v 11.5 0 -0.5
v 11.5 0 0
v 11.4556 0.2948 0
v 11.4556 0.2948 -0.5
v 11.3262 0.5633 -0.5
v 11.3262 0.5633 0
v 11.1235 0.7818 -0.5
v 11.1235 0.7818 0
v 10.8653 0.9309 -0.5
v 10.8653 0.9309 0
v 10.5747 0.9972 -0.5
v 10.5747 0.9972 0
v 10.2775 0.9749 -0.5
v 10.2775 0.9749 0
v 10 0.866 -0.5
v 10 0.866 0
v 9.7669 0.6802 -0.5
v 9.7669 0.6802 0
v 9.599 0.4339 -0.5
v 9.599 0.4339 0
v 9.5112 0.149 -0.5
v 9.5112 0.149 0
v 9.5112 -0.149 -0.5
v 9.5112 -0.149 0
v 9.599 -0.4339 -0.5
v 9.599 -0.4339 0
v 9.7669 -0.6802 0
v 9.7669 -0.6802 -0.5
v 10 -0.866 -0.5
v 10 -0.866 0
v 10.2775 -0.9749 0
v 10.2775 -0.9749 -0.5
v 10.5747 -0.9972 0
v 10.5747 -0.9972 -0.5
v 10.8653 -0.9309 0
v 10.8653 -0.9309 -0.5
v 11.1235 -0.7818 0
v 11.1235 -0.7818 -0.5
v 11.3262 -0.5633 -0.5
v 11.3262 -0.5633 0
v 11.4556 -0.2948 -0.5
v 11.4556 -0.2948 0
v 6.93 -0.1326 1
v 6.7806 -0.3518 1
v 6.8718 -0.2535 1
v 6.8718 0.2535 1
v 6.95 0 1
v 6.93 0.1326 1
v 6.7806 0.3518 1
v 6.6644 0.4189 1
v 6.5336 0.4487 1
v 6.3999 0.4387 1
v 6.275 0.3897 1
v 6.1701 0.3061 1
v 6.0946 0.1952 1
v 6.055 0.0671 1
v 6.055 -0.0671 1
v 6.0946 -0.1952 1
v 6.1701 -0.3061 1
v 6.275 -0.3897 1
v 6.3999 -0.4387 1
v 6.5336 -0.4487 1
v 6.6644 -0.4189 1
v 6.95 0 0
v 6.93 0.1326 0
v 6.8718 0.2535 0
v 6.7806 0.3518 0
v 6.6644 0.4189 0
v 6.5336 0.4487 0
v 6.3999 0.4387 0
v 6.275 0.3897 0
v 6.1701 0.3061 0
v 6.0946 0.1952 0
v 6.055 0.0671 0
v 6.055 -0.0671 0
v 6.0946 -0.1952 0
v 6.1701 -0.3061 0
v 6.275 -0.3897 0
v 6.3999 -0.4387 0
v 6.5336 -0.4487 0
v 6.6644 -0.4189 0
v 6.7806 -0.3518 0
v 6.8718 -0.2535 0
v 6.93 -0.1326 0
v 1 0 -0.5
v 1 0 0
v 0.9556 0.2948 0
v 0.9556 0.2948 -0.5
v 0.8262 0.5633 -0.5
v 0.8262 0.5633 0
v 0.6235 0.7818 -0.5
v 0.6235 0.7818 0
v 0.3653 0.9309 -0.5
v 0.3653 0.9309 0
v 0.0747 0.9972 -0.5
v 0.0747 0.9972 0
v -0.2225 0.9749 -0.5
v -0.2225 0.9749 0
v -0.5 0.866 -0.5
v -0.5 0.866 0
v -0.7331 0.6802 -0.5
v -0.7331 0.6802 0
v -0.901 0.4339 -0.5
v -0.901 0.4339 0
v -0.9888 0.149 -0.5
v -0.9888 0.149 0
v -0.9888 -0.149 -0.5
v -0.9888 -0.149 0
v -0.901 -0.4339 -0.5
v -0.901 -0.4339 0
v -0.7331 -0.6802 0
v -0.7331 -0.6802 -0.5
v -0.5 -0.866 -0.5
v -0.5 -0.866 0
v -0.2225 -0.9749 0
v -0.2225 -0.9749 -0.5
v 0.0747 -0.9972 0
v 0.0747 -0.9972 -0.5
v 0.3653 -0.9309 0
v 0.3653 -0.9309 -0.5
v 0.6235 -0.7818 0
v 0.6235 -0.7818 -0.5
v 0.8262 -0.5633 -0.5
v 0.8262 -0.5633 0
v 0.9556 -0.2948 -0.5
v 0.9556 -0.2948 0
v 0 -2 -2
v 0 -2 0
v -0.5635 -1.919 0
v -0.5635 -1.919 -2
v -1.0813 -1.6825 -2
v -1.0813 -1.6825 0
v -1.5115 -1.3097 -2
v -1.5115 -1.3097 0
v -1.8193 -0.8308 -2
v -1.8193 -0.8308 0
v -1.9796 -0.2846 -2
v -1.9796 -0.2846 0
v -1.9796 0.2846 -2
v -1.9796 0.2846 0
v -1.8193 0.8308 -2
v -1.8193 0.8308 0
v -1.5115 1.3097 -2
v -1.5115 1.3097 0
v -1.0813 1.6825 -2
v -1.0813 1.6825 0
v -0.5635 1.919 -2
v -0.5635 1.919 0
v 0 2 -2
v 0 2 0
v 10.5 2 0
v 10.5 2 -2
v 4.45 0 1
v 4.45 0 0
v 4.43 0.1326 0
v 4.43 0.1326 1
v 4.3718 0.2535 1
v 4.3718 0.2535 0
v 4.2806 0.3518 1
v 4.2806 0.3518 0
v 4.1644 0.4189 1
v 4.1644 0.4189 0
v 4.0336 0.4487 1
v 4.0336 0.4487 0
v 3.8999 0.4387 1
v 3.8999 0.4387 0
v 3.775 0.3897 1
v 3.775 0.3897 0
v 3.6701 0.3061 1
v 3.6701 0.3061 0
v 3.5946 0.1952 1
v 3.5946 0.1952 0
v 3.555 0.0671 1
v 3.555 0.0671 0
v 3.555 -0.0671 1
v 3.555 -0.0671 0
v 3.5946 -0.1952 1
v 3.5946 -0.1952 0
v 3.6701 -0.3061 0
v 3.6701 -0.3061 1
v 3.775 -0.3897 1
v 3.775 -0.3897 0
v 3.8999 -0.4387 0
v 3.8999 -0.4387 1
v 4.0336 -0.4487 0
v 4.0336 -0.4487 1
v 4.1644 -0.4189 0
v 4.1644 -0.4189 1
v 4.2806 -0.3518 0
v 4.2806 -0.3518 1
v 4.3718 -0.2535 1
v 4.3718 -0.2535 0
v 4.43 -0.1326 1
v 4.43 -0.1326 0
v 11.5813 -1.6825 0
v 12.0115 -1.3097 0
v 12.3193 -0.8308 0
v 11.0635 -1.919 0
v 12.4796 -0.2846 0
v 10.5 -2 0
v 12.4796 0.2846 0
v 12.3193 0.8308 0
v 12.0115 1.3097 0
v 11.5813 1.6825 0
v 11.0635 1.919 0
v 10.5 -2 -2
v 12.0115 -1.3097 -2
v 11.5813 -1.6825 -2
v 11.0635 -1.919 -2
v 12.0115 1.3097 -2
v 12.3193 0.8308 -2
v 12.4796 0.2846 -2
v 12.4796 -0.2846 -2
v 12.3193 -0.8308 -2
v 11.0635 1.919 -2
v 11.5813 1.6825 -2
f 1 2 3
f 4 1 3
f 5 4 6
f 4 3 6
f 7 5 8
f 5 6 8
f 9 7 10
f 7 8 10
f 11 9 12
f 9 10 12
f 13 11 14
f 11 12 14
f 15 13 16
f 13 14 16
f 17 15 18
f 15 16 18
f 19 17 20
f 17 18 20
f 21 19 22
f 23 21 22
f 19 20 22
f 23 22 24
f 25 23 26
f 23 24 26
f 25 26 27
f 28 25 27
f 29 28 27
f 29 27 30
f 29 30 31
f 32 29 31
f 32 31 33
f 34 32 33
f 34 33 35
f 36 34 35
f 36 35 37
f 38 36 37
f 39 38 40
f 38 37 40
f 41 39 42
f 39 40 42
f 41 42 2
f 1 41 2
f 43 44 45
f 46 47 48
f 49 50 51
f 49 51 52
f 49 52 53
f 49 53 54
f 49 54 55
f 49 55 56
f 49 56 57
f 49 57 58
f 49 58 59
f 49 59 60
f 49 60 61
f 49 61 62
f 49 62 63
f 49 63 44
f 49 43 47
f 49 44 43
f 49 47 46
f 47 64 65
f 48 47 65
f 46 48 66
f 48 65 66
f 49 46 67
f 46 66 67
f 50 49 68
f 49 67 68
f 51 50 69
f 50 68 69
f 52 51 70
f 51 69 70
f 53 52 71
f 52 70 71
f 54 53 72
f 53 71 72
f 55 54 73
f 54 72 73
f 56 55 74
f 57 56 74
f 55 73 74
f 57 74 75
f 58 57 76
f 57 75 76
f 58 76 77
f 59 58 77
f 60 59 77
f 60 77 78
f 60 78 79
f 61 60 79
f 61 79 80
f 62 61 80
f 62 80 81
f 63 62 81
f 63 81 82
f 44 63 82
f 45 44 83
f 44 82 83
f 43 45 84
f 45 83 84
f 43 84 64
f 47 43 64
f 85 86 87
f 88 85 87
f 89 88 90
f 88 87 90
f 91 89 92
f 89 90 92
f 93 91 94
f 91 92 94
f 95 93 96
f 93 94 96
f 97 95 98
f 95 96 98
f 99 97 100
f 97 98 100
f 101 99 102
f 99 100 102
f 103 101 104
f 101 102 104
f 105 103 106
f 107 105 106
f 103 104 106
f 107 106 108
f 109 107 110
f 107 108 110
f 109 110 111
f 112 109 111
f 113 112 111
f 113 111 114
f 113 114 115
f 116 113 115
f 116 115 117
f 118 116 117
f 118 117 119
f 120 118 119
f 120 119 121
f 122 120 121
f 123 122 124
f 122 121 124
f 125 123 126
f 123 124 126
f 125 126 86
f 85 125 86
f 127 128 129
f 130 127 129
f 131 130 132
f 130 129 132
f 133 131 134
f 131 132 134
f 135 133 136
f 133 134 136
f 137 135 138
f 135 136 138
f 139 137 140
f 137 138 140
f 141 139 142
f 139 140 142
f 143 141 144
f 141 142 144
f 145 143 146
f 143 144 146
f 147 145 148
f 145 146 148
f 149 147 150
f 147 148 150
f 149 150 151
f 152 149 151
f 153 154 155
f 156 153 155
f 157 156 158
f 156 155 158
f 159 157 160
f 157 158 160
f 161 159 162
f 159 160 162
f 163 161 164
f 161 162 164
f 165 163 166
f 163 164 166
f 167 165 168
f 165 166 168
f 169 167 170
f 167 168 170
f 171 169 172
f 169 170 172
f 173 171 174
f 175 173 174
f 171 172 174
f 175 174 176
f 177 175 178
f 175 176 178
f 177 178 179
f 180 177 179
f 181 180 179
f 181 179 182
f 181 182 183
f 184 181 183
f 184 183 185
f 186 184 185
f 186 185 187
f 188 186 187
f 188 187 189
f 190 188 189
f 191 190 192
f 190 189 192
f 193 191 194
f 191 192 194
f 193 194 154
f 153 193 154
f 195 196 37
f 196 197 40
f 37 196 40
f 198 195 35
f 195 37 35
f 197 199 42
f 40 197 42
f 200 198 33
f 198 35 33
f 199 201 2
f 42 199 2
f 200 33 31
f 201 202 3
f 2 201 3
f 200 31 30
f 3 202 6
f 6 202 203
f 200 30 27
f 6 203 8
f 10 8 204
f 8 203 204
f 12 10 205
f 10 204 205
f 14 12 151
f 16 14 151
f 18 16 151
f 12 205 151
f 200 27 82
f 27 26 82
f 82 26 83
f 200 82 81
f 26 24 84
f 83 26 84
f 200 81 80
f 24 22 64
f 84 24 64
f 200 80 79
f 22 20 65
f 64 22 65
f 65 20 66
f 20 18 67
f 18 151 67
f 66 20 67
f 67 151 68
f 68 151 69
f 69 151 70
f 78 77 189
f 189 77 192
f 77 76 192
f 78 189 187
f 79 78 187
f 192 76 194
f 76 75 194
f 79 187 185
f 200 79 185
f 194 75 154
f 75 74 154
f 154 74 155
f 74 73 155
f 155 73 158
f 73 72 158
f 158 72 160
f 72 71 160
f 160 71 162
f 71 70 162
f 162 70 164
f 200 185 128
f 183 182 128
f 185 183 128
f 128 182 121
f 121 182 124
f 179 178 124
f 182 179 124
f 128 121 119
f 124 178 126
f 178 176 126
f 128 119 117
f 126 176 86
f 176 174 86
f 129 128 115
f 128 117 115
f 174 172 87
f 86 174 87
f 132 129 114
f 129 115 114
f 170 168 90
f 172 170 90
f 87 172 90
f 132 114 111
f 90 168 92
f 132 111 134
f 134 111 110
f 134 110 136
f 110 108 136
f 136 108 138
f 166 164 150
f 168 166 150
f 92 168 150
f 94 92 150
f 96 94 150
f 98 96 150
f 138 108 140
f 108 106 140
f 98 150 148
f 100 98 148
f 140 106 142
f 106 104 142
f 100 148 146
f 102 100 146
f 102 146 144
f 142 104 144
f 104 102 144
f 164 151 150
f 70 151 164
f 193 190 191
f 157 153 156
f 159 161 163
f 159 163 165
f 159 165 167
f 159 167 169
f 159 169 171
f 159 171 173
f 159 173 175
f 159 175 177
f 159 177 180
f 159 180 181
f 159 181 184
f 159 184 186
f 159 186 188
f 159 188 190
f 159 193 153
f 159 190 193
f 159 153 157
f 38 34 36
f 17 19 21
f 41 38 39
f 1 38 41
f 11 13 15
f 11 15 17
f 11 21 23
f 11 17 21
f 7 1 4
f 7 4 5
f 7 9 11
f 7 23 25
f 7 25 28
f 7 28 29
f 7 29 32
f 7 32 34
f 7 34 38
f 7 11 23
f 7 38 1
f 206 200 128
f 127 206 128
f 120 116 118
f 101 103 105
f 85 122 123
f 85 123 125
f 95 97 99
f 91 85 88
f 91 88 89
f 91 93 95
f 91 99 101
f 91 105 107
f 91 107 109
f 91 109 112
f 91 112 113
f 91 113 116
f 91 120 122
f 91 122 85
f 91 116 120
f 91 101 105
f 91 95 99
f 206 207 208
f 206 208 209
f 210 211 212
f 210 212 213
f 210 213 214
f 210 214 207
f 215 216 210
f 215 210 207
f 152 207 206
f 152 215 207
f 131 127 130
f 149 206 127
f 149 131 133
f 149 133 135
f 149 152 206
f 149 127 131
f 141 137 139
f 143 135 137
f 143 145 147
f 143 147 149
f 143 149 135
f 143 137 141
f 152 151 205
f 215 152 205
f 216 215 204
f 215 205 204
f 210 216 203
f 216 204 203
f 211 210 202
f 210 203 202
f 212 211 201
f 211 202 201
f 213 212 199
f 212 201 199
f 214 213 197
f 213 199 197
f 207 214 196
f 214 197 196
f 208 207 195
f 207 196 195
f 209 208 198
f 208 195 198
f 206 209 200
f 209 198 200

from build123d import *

# Parameters (mm, degrees)
BASE_FLANGE1_DEPTH  = 2
SKETCH6_R           = 1
CUT_EXTRUDE1_DEPTH  = 0.5
SKETCH8_R           = 0.45
BOSS_EXTRUDE1_DEPTH = 1


# Sheet-metal steps are written as plain solids
with BuildPart() as part:
    # Sketch1 → Base-Flange1 (new body)
    with BuildSketch(Plane.XY):
        with BuildLine():
            Line((10.5, -2), (0, -2))
            ThreePointArc((0, -2), (-2, 0), (0, 2))
            Line((0, 2), (10.5, 2))
            ThreePointArc((10.5, 2), (12.5, 0), (10.5, -2))
        make_face()
    extrude(amount=-BASE_FLANGE1_DEPTH)

    # Sketch6 → Cut-Extrude1 (cut)
    with BuildSketch(Plane.XY):
        Circle(SKETCH6_R)
        with Locations((10.5, 0)):
            Circle(SKETCH6_R)
    extrude(amount=-CUT_EXTRUDE1_DEPTH, mode=Mode.SUBTRACT)

    # Sketch8 → Boss-Extrude1 (add)
    with BuildSketch(Plane.XY):
        with Locations((4, 0)):
            Circle(SKETCH8_R)
        with Locations((6.5, 0)):
            Circle(SKETCH8_R)
    extrude(amount=BOSS_EXTRUDE1_DEPTH)


solid = part.part
